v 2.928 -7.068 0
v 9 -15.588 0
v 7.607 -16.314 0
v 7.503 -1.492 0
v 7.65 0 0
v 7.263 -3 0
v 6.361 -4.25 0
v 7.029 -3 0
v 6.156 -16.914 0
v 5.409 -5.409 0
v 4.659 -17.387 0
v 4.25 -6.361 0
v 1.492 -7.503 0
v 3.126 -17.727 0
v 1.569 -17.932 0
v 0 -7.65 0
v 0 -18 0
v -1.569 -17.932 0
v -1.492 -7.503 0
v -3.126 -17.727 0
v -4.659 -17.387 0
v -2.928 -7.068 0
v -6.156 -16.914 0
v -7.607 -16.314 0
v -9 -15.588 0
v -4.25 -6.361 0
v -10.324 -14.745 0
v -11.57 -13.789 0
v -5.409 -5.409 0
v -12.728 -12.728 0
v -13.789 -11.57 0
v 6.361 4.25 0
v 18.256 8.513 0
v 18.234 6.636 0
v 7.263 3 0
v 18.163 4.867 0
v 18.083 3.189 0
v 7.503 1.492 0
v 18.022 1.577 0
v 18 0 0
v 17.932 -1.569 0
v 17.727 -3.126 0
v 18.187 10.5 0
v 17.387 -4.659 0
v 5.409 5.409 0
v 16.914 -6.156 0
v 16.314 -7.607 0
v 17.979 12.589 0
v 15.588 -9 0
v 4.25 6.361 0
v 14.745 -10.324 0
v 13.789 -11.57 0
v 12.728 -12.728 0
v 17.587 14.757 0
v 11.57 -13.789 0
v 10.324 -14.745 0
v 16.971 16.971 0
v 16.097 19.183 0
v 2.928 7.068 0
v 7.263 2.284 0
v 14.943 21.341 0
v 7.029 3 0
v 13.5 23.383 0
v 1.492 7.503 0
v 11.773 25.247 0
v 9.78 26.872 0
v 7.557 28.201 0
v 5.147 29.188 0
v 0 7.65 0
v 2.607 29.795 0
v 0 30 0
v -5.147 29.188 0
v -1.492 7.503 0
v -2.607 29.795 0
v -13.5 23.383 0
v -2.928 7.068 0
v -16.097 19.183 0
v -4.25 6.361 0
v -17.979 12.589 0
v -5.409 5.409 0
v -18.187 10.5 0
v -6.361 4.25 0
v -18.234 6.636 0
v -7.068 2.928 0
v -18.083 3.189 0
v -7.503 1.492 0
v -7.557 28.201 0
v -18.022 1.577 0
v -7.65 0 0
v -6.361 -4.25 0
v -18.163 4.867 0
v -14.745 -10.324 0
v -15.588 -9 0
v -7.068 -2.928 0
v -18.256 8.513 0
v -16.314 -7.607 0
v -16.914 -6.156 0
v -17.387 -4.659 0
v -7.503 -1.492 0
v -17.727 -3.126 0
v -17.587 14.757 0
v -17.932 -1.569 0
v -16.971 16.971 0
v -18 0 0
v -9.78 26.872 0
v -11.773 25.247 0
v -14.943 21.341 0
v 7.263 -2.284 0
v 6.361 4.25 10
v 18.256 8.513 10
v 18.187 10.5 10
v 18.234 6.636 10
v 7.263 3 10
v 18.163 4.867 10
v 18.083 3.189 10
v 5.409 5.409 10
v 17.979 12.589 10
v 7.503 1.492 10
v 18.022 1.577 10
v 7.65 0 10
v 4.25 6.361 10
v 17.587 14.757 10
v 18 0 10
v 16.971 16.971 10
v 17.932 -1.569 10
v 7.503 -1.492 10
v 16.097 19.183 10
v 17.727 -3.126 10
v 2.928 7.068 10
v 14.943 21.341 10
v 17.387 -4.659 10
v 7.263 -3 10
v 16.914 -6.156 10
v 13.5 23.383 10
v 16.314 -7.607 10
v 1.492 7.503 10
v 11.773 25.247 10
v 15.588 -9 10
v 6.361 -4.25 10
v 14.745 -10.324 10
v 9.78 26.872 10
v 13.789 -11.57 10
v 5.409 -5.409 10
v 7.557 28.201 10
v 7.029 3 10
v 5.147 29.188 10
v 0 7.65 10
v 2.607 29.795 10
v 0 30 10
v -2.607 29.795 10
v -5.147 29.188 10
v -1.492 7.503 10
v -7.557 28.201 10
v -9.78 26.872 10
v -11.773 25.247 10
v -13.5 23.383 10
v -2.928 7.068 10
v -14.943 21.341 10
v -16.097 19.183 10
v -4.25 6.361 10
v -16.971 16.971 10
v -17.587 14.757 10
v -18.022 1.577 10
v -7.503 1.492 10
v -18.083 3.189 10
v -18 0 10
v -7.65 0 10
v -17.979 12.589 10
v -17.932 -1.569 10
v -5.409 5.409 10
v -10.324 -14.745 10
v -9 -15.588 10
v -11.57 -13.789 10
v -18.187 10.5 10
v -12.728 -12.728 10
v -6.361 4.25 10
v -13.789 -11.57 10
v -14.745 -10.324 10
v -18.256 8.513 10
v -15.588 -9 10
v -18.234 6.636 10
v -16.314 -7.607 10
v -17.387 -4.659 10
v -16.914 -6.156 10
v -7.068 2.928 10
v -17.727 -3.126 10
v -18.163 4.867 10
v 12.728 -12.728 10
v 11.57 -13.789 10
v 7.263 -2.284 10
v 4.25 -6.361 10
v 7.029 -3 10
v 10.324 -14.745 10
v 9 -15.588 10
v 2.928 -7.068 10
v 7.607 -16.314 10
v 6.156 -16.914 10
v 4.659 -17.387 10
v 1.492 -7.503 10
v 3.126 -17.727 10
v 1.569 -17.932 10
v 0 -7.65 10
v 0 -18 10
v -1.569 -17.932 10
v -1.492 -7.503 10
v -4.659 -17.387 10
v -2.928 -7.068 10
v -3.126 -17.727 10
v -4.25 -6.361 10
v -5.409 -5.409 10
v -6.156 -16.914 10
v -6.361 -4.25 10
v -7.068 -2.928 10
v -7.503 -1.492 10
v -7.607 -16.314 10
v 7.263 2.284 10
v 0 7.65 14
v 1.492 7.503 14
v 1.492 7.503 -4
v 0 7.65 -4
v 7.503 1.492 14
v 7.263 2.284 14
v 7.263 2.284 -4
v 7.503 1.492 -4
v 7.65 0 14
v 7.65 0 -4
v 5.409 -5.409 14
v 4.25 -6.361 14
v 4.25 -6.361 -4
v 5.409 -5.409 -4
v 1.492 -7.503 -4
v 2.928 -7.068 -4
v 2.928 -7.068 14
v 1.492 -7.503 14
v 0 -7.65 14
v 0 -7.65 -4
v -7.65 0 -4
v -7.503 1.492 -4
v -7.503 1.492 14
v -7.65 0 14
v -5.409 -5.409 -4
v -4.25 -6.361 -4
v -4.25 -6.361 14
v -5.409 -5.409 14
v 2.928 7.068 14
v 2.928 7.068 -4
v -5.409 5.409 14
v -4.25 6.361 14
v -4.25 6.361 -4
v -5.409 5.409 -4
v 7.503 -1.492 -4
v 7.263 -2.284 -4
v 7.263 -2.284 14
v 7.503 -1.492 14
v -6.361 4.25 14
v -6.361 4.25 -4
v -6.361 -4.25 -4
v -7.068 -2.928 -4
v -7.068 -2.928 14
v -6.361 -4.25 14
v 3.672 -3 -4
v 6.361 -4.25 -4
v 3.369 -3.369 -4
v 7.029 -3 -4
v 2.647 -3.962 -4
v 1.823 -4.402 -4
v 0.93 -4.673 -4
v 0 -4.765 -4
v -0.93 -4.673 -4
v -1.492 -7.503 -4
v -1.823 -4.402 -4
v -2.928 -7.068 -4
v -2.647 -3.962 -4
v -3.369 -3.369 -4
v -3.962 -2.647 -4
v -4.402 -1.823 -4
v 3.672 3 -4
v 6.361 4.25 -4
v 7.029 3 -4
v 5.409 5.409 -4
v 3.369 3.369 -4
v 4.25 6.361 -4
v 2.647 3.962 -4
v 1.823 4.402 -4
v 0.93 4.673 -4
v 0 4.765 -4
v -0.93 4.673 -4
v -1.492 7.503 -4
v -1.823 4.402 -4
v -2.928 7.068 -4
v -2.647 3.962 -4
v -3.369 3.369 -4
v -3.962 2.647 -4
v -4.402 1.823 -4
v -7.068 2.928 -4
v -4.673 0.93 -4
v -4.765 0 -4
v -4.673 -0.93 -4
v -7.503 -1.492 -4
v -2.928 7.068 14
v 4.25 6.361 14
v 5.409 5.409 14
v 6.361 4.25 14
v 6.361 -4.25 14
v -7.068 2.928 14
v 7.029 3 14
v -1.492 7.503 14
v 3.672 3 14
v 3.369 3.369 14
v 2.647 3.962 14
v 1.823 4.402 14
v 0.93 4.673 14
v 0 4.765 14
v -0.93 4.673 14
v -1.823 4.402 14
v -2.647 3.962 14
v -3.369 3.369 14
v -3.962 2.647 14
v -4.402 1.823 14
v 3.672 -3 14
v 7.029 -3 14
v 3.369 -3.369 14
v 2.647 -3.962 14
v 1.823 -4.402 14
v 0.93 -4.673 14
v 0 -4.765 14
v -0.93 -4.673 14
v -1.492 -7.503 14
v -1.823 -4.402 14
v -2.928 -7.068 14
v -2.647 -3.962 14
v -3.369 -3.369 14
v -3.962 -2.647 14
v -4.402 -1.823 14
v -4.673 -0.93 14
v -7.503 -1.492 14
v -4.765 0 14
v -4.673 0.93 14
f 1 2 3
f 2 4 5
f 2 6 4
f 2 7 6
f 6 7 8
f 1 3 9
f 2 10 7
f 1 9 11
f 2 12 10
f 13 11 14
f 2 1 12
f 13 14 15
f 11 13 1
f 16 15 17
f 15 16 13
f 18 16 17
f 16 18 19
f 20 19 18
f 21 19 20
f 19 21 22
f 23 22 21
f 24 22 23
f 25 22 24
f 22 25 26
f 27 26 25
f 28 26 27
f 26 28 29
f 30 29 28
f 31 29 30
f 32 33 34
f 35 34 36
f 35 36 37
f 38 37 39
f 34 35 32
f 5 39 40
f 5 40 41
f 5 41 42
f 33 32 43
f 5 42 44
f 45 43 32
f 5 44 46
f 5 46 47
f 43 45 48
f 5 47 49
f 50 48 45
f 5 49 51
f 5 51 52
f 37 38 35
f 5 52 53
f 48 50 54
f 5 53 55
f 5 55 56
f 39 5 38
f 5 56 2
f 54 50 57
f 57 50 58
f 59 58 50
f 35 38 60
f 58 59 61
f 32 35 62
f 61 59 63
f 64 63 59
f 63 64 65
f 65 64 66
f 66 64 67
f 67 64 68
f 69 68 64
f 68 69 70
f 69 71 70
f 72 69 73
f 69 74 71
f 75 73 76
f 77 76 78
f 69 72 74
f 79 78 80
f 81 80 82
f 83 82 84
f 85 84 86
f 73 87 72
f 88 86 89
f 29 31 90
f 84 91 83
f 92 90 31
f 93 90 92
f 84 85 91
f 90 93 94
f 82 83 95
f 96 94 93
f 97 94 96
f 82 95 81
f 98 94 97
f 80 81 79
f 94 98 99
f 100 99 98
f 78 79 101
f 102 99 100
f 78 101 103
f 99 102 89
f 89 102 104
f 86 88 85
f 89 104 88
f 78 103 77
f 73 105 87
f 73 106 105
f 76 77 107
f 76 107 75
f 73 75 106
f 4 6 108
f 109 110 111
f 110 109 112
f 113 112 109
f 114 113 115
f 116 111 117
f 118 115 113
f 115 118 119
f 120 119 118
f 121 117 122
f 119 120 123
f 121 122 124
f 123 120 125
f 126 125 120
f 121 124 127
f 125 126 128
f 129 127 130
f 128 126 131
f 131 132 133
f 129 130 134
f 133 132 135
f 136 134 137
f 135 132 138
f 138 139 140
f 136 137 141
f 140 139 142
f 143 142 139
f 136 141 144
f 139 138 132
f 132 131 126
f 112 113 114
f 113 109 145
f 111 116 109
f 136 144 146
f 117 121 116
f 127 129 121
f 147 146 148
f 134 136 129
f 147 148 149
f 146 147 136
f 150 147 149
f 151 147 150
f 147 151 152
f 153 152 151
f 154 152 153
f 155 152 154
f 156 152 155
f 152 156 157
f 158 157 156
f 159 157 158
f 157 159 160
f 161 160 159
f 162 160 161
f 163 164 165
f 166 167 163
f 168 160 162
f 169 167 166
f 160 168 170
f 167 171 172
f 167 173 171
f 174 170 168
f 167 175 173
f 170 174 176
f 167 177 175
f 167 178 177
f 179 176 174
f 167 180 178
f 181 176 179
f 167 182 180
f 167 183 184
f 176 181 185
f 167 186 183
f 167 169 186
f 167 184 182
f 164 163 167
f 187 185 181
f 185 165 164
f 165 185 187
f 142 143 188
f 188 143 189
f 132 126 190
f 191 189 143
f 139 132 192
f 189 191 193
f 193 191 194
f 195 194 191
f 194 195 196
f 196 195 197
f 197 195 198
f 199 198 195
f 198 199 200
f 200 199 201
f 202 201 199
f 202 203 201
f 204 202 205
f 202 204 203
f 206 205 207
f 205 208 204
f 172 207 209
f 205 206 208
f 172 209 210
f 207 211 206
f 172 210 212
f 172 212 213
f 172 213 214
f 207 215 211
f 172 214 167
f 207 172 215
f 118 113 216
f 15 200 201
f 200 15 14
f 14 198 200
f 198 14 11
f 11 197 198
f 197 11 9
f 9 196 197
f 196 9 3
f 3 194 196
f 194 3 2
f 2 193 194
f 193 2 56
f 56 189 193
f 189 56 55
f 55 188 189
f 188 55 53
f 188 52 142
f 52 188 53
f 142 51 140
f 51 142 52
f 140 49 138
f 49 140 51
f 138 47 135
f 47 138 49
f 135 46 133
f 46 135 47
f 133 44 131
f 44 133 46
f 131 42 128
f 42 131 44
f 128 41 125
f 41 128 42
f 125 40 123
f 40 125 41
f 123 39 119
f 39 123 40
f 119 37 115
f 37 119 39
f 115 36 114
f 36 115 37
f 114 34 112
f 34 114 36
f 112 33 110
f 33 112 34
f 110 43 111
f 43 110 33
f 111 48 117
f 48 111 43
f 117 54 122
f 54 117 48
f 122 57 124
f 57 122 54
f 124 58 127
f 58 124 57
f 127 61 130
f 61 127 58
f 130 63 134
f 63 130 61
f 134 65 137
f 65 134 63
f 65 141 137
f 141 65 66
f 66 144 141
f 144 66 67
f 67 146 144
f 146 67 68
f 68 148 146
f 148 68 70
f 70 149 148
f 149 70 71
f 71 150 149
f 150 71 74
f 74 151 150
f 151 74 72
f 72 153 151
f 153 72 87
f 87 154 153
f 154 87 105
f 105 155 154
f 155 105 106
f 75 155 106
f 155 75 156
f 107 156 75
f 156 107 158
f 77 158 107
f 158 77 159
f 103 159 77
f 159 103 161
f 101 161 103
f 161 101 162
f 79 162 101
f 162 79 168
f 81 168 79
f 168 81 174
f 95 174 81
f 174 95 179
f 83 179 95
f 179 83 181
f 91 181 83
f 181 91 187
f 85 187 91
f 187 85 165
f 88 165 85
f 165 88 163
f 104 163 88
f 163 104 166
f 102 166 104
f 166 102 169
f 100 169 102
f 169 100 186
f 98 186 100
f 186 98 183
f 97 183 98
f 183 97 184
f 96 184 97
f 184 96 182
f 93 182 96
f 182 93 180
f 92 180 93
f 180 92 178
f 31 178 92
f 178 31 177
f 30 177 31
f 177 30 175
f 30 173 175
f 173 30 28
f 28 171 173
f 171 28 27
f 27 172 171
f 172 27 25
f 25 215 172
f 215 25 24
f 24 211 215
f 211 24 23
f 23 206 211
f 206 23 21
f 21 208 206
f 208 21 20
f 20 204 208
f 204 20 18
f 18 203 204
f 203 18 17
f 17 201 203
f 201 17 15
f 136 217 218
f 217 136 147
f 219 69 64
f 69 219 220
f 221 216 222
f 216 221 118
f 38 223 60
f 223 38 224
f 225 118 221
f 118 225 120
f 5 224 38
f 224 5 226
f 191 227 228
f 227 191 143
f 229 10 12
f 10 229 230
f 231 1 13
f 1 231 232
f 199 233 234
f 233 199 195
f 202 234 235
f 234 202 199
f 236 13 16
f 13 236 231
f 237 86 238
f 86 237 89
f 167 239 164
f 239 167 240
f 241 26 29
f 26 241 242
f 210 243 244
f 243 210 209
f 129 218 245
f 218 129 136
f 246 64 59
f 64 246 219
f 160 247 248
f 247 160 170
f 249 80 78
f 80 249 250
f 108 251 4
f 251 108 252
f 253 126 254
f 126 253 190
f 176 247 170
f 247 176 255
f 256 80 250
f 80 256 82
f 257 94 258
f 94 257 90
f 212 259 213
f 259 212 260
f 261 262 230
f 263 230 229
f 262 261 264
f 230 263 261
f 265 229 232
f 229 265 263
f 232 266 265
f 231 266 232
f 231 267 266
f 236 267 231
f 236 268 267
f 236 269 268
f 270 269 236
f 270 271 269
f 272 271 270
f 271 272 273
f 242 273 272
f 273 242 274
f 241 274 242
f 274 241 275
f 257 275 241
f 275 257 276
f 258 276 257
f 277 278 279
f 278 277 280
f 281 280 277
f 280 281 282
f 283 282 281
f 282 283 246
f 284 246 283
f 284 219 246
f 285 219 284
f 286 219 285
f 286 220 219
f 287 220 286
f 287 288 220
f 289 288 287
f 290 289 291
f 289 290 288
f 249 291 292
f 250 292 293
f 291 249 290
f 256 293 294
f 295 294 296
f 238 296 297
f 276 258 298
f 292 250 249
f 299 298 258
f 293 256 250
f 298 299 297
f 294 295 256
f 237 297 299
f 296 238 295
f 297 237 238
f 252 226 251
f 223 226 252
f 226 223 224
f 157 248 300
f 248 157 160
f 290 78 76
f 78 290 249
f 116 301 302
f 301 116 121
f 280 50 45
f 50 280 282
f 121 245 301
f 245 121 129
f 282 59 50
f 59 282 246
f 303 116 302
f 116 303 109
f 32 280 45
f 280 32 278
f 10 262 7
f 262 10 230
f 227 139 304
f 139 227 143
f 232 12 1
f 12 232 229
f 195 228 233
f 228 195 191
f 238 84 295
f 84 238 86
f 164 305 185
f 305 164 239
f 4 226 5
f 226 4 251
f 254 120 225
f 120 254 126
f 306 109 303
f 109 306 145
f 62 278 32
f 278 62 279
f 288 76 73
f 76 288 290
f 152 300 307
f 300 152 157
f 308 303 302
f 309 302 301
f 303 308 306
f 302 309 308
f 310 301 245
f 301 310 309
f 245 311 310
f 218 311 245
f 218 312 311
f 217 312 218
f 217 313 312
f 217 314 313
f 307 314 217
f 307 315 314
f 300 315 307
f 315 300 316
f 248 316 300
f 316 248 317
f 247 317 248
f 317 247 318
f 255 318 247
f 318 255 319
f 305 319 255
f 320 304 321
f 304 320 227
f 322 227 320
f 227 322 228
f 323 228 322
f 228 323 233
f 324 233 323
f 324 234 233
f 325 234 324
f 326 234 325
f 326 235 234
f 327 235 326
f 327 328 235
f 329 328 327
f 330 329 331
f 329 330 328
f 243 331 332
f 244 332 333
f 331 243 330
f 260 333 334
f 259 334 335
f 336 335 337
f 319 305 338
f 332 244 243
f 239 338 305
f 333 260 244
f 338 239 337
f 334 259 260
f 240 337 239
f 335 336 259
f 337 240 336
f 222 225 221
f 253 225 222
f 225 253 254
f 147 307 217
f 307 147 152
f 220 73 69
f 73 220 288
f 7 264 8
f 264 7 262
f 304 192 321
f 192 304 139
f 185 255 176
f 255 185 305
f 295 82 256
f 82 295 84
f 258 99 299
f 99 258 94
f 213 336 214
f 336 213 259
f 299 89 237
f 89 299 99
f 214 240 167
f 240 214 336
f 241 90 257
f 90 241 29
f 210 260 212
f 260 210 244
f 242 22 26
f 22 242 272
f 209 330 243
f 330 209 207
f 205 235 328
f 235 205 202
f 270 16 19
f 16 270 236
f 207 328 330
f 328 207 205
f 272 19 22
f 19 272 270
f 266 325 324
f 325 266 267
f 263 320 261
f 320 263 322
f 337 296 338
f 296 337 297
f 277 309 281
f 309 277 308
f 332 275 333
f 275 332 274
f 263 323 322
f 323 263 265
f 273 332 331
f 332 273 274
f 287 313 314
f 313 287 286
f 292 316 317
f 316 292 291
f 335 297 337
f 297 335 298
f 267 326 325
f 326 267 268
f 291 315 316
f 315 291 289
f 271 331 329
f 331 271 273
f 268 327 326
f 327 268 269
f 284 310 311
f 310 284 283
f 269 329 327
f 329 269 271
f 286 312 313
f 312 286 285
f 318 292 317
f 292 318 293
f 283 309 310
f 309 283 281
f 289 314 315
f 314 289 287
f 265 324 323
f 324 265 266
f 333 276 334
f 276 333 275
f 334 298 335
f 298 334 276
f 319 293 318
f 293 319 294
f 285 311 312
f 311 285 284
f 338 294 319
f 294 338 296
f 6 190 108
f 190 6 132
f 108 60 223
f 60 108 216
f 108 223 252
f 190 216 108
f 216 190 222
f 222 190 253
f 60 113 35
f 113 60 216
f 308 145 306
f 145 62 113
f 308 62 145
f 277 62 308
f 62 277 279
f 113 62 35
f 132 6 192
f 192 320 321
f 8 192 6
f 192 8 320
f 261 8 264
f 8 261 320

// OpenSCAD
$fn = 32;

// ----------------------------------------------------------------------
// Cam: base radius 18 mm with a 12 mm lift over 180 degrees
// ----------------------------------------------------------------------

// --- parameters (mm) ---
base_r = 18;              // base radius
lift = 12;                // lift height above the base radius
lift_span = 180;          // angular width of the lift
lift_start = 0;           // angle where the lift starts
cam_t = 10;               // cam plate thickness
hub_d = 15.3;             // hub diameter
hub_h = 18;               // hub height
bore_d = 9.53;            // bore
key_w = 6;                // keyway width
key_depth = 1.6;          // keyway depth

cam_profile = [[18, 0], [18.022, 1.577], [18.083, 3.189], [18.163, 4.867], [18.234, 6.636], [18.256, 8.513], [18.187, 10.5], [17.979, 12.589], [17.587, 14.757], [16.971, 16.971], [16.097, 19.183], [14.943, 21.341], [13.5, 23.383], [11.773, 25.247], [9.78, 26.872], [7.557, 28.201], [5.147, 29.188], [2.607, 29.795], [0, 30], [-2.607, 29.795], [-5.147, 29.188], [-7.557, 28.201], [-9.78, 26.872], [-11.773, 25.247], [-13.5, 23.383], [-14.943, 21.341], [-16.097, 19.183], [-16.971, 16.971], [-17.587, 14.757], [-17.979, 12.589], [-18.187, 10.5], [-18.256, 8.513], [-18.234, 6.636], [-18.163, 4.867], [-18.083, 3.189], [-18.022, 1.577], [-18, 0], [-17.932, -1.569], [-17.727, -3.126], [-17.387, -4.659], [-16.914, -6.156], [-16.314, -7.607], [-15.588, -9], [-14.745, -10.324], [-13.789, -11.57], [-12.728, -12.728], [-11.57, -13.789], [-10.324, -14.745], [-9, -15.588], [-7.607, -16.314], [-6.156, -16.914], [-4.659, -17.387], [-3.126, -17.727], [-1.569, -17.932], [0, -18], [1.569, -17.932], [3.126, -17.727], [4.659, -17.387], [6.156, -16.914], [7.607, -16.314], [9, -15.588], [10.324, -14.745], [11.57, -13.789], [12.728, -12.728], [13.789, -11.57], [14.745, -10.324], [15.588, -9], [16.314, -7.607], [16.914, -6.156], [17.387, -4.659], [17.727, -3.126], [17.932, -1.569]];

difference() {
  union() {
    linear_extrude(height = cam_t) polygon(cam_profile);
    /* hub, proud of the cam plate on both sides */
    translate([0, 0, -4]) cylinder(h = hub_h, d = hub_d);
  }
  /* bore through the hub, 2.5 mm clear on both faces */
  translate([0, 0, -6.5]) cylinder(h = hub_h + 5, d = bore_d);
  /* keyway, milled through the whole hub */
  translate([3.163, -3, -6.5]) cube([4.1, 6, 23]);
}
